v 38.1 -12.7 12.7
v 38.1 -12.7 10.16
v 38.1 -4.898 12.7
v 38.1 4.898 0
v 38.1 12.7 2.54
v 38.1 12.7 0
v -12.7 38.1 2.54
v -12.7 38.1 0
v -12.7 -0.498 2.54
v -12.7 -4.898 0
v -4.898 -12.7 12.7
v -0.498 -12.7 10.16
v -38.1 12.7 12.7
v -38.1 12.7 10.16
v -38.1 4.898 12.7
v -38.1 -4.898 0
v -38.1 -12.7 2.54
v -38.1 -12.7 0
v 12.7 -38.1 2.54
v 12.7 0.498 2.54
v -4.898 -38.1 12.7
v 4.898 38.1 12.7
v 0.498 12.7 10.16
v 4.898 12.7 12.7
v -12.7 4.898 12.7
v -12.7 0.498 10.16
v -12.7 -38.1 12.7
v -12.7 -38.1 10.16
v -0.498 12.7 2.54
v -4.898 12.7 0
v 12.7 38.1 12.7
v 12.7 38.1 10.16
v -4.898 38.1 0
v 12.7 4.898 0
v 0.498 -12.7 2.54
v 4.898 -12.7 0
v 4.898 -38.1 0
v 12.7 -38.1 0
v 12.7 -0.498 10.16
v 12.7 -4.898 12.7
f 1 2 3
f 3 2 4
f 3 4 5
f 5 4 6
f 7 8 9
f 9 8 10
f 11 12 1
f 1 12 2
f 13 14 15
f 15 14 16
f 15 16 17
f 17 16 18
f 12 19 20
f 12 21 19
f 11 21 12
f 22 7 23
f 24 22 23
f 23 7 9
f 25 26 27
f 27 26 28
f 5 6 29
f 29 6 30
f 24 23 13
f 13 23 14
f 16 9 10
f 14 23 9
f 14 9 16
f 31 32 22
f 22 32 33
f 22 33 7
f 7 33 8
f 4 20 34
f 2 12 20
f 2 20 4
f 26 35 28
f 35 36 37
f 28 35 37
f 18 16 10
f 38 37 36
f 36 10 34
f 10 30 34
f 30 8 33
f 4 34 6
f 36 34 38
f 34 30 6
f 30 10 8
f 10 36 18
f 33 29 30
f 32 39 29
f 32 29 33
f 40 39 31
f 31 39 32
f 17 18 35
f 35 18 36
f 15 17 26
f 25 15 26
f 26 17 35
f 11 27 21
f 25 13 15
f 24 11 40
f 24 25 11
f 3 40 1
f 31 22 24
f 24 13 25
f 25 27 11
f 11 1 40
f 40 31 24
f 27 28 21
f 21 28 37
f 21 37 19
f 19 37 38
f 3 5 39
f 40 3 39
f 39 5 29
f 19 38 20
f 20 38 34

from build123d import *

# Parameters (mm, degrees)
F1_DEPTH   = 12.7
F2_SIZE2   = 17.5976362049
F2_SIZE    = 10.16
F2_2_SIZE2 = 17.5976362049
F2_2_SIZE  = 10.16
F3_SIZE2   = 10.16
F3_SIZE    = 17.5976362049
F3_2_SIZE2 = 10.16
F3_2_SIZE  = 17.5976362049
F4_SIZE2   = 10.16
F4_SIZE    = 17.5976362049


with BuildPart() as f1:
    # F0 (on Top) → F1 (new body)
    with BuildSketch(Plane.XY):
        Polygon((12.7, 38.1), (-12.7, 38.1), (-12.7, 12.7), (-38.1, 12.7), (-38.1, -12.7), (-12.7, -12.7), (-12.7, -38.1), (12.7, -38.1), (12.7, -12.7), (38.1, -12.7), (38.1, 12.7), (12.7, 12.7), align=None)
    extrude(amount=F1_DEPTH)

    # F2
    f2_edges = [f1.edges().sort_by_distance(p)[0] for p in [
        (-12.7, -25.4, 0),
    ]]
    f2_side = f1.faces().sort_by_distance((-12.7, -25.4, 6.35))[0]
    chamfer(f2_edges, length=F2_SIZE, length2=F2_SIZE2, reference=f2_side)

    # F2#2
    f2_2_edges = [f1.edges().sort_by_distance(p)[0] for p in [
        (12.7, -25.4, 12.7),
    ]]
    f2_2_side = f1.faces().sort_by_distance((12.7, -25.4, 6.35))[0]
    chamfer(f2_2_edges, length=F2_2_SIZE, length2=F2_2_SIZE2, reference=f2_2_side)

    # F3
    f3_edges = [f1.edges().sort_by_distance(p)[0] for p in [
        (-25.4, 12.7, 0),
        (12.7, 25.4, 0),
        (25.4, -12.7, 0),
    ]]
    f3_side = f1.faces().sort_by_distance((0.627515, 4.085652, 0))[0]
    chamfer(f3_edges, length=F3_SIZE, length2=F3_SIZE2, reference=f3_side)

    # F3#2
    f3_2_edges = [f1.edges().sort_by_distance(p)[0] for p in [
        (-25.4, -12.7, 12.7),
    ]]
    f3_2_side = f1.faces().sort_by_distance((-0.627515, 4.085652, 12.7))[0]
    chamfer(f3_2_edges, length=F3_2_SIZE, length2=F3_2_SIZE2, reference=f3_2_side)

    # F4
    f4_edges = [f1.edges().sort_by_distance(p)[0] for p in [
        (-12.7, 25.4, 12.7),
        (25.4, 12.7, 12.7),
    ]]
    f4_side = f1.faces().sort_by_distance((4.121012, 5.616612, 12.7))[0]
    chamfer(f4_edges, length=F4_SIZE, length2=F4_SIZE2, reference=f4_side)


solid = f1.part
